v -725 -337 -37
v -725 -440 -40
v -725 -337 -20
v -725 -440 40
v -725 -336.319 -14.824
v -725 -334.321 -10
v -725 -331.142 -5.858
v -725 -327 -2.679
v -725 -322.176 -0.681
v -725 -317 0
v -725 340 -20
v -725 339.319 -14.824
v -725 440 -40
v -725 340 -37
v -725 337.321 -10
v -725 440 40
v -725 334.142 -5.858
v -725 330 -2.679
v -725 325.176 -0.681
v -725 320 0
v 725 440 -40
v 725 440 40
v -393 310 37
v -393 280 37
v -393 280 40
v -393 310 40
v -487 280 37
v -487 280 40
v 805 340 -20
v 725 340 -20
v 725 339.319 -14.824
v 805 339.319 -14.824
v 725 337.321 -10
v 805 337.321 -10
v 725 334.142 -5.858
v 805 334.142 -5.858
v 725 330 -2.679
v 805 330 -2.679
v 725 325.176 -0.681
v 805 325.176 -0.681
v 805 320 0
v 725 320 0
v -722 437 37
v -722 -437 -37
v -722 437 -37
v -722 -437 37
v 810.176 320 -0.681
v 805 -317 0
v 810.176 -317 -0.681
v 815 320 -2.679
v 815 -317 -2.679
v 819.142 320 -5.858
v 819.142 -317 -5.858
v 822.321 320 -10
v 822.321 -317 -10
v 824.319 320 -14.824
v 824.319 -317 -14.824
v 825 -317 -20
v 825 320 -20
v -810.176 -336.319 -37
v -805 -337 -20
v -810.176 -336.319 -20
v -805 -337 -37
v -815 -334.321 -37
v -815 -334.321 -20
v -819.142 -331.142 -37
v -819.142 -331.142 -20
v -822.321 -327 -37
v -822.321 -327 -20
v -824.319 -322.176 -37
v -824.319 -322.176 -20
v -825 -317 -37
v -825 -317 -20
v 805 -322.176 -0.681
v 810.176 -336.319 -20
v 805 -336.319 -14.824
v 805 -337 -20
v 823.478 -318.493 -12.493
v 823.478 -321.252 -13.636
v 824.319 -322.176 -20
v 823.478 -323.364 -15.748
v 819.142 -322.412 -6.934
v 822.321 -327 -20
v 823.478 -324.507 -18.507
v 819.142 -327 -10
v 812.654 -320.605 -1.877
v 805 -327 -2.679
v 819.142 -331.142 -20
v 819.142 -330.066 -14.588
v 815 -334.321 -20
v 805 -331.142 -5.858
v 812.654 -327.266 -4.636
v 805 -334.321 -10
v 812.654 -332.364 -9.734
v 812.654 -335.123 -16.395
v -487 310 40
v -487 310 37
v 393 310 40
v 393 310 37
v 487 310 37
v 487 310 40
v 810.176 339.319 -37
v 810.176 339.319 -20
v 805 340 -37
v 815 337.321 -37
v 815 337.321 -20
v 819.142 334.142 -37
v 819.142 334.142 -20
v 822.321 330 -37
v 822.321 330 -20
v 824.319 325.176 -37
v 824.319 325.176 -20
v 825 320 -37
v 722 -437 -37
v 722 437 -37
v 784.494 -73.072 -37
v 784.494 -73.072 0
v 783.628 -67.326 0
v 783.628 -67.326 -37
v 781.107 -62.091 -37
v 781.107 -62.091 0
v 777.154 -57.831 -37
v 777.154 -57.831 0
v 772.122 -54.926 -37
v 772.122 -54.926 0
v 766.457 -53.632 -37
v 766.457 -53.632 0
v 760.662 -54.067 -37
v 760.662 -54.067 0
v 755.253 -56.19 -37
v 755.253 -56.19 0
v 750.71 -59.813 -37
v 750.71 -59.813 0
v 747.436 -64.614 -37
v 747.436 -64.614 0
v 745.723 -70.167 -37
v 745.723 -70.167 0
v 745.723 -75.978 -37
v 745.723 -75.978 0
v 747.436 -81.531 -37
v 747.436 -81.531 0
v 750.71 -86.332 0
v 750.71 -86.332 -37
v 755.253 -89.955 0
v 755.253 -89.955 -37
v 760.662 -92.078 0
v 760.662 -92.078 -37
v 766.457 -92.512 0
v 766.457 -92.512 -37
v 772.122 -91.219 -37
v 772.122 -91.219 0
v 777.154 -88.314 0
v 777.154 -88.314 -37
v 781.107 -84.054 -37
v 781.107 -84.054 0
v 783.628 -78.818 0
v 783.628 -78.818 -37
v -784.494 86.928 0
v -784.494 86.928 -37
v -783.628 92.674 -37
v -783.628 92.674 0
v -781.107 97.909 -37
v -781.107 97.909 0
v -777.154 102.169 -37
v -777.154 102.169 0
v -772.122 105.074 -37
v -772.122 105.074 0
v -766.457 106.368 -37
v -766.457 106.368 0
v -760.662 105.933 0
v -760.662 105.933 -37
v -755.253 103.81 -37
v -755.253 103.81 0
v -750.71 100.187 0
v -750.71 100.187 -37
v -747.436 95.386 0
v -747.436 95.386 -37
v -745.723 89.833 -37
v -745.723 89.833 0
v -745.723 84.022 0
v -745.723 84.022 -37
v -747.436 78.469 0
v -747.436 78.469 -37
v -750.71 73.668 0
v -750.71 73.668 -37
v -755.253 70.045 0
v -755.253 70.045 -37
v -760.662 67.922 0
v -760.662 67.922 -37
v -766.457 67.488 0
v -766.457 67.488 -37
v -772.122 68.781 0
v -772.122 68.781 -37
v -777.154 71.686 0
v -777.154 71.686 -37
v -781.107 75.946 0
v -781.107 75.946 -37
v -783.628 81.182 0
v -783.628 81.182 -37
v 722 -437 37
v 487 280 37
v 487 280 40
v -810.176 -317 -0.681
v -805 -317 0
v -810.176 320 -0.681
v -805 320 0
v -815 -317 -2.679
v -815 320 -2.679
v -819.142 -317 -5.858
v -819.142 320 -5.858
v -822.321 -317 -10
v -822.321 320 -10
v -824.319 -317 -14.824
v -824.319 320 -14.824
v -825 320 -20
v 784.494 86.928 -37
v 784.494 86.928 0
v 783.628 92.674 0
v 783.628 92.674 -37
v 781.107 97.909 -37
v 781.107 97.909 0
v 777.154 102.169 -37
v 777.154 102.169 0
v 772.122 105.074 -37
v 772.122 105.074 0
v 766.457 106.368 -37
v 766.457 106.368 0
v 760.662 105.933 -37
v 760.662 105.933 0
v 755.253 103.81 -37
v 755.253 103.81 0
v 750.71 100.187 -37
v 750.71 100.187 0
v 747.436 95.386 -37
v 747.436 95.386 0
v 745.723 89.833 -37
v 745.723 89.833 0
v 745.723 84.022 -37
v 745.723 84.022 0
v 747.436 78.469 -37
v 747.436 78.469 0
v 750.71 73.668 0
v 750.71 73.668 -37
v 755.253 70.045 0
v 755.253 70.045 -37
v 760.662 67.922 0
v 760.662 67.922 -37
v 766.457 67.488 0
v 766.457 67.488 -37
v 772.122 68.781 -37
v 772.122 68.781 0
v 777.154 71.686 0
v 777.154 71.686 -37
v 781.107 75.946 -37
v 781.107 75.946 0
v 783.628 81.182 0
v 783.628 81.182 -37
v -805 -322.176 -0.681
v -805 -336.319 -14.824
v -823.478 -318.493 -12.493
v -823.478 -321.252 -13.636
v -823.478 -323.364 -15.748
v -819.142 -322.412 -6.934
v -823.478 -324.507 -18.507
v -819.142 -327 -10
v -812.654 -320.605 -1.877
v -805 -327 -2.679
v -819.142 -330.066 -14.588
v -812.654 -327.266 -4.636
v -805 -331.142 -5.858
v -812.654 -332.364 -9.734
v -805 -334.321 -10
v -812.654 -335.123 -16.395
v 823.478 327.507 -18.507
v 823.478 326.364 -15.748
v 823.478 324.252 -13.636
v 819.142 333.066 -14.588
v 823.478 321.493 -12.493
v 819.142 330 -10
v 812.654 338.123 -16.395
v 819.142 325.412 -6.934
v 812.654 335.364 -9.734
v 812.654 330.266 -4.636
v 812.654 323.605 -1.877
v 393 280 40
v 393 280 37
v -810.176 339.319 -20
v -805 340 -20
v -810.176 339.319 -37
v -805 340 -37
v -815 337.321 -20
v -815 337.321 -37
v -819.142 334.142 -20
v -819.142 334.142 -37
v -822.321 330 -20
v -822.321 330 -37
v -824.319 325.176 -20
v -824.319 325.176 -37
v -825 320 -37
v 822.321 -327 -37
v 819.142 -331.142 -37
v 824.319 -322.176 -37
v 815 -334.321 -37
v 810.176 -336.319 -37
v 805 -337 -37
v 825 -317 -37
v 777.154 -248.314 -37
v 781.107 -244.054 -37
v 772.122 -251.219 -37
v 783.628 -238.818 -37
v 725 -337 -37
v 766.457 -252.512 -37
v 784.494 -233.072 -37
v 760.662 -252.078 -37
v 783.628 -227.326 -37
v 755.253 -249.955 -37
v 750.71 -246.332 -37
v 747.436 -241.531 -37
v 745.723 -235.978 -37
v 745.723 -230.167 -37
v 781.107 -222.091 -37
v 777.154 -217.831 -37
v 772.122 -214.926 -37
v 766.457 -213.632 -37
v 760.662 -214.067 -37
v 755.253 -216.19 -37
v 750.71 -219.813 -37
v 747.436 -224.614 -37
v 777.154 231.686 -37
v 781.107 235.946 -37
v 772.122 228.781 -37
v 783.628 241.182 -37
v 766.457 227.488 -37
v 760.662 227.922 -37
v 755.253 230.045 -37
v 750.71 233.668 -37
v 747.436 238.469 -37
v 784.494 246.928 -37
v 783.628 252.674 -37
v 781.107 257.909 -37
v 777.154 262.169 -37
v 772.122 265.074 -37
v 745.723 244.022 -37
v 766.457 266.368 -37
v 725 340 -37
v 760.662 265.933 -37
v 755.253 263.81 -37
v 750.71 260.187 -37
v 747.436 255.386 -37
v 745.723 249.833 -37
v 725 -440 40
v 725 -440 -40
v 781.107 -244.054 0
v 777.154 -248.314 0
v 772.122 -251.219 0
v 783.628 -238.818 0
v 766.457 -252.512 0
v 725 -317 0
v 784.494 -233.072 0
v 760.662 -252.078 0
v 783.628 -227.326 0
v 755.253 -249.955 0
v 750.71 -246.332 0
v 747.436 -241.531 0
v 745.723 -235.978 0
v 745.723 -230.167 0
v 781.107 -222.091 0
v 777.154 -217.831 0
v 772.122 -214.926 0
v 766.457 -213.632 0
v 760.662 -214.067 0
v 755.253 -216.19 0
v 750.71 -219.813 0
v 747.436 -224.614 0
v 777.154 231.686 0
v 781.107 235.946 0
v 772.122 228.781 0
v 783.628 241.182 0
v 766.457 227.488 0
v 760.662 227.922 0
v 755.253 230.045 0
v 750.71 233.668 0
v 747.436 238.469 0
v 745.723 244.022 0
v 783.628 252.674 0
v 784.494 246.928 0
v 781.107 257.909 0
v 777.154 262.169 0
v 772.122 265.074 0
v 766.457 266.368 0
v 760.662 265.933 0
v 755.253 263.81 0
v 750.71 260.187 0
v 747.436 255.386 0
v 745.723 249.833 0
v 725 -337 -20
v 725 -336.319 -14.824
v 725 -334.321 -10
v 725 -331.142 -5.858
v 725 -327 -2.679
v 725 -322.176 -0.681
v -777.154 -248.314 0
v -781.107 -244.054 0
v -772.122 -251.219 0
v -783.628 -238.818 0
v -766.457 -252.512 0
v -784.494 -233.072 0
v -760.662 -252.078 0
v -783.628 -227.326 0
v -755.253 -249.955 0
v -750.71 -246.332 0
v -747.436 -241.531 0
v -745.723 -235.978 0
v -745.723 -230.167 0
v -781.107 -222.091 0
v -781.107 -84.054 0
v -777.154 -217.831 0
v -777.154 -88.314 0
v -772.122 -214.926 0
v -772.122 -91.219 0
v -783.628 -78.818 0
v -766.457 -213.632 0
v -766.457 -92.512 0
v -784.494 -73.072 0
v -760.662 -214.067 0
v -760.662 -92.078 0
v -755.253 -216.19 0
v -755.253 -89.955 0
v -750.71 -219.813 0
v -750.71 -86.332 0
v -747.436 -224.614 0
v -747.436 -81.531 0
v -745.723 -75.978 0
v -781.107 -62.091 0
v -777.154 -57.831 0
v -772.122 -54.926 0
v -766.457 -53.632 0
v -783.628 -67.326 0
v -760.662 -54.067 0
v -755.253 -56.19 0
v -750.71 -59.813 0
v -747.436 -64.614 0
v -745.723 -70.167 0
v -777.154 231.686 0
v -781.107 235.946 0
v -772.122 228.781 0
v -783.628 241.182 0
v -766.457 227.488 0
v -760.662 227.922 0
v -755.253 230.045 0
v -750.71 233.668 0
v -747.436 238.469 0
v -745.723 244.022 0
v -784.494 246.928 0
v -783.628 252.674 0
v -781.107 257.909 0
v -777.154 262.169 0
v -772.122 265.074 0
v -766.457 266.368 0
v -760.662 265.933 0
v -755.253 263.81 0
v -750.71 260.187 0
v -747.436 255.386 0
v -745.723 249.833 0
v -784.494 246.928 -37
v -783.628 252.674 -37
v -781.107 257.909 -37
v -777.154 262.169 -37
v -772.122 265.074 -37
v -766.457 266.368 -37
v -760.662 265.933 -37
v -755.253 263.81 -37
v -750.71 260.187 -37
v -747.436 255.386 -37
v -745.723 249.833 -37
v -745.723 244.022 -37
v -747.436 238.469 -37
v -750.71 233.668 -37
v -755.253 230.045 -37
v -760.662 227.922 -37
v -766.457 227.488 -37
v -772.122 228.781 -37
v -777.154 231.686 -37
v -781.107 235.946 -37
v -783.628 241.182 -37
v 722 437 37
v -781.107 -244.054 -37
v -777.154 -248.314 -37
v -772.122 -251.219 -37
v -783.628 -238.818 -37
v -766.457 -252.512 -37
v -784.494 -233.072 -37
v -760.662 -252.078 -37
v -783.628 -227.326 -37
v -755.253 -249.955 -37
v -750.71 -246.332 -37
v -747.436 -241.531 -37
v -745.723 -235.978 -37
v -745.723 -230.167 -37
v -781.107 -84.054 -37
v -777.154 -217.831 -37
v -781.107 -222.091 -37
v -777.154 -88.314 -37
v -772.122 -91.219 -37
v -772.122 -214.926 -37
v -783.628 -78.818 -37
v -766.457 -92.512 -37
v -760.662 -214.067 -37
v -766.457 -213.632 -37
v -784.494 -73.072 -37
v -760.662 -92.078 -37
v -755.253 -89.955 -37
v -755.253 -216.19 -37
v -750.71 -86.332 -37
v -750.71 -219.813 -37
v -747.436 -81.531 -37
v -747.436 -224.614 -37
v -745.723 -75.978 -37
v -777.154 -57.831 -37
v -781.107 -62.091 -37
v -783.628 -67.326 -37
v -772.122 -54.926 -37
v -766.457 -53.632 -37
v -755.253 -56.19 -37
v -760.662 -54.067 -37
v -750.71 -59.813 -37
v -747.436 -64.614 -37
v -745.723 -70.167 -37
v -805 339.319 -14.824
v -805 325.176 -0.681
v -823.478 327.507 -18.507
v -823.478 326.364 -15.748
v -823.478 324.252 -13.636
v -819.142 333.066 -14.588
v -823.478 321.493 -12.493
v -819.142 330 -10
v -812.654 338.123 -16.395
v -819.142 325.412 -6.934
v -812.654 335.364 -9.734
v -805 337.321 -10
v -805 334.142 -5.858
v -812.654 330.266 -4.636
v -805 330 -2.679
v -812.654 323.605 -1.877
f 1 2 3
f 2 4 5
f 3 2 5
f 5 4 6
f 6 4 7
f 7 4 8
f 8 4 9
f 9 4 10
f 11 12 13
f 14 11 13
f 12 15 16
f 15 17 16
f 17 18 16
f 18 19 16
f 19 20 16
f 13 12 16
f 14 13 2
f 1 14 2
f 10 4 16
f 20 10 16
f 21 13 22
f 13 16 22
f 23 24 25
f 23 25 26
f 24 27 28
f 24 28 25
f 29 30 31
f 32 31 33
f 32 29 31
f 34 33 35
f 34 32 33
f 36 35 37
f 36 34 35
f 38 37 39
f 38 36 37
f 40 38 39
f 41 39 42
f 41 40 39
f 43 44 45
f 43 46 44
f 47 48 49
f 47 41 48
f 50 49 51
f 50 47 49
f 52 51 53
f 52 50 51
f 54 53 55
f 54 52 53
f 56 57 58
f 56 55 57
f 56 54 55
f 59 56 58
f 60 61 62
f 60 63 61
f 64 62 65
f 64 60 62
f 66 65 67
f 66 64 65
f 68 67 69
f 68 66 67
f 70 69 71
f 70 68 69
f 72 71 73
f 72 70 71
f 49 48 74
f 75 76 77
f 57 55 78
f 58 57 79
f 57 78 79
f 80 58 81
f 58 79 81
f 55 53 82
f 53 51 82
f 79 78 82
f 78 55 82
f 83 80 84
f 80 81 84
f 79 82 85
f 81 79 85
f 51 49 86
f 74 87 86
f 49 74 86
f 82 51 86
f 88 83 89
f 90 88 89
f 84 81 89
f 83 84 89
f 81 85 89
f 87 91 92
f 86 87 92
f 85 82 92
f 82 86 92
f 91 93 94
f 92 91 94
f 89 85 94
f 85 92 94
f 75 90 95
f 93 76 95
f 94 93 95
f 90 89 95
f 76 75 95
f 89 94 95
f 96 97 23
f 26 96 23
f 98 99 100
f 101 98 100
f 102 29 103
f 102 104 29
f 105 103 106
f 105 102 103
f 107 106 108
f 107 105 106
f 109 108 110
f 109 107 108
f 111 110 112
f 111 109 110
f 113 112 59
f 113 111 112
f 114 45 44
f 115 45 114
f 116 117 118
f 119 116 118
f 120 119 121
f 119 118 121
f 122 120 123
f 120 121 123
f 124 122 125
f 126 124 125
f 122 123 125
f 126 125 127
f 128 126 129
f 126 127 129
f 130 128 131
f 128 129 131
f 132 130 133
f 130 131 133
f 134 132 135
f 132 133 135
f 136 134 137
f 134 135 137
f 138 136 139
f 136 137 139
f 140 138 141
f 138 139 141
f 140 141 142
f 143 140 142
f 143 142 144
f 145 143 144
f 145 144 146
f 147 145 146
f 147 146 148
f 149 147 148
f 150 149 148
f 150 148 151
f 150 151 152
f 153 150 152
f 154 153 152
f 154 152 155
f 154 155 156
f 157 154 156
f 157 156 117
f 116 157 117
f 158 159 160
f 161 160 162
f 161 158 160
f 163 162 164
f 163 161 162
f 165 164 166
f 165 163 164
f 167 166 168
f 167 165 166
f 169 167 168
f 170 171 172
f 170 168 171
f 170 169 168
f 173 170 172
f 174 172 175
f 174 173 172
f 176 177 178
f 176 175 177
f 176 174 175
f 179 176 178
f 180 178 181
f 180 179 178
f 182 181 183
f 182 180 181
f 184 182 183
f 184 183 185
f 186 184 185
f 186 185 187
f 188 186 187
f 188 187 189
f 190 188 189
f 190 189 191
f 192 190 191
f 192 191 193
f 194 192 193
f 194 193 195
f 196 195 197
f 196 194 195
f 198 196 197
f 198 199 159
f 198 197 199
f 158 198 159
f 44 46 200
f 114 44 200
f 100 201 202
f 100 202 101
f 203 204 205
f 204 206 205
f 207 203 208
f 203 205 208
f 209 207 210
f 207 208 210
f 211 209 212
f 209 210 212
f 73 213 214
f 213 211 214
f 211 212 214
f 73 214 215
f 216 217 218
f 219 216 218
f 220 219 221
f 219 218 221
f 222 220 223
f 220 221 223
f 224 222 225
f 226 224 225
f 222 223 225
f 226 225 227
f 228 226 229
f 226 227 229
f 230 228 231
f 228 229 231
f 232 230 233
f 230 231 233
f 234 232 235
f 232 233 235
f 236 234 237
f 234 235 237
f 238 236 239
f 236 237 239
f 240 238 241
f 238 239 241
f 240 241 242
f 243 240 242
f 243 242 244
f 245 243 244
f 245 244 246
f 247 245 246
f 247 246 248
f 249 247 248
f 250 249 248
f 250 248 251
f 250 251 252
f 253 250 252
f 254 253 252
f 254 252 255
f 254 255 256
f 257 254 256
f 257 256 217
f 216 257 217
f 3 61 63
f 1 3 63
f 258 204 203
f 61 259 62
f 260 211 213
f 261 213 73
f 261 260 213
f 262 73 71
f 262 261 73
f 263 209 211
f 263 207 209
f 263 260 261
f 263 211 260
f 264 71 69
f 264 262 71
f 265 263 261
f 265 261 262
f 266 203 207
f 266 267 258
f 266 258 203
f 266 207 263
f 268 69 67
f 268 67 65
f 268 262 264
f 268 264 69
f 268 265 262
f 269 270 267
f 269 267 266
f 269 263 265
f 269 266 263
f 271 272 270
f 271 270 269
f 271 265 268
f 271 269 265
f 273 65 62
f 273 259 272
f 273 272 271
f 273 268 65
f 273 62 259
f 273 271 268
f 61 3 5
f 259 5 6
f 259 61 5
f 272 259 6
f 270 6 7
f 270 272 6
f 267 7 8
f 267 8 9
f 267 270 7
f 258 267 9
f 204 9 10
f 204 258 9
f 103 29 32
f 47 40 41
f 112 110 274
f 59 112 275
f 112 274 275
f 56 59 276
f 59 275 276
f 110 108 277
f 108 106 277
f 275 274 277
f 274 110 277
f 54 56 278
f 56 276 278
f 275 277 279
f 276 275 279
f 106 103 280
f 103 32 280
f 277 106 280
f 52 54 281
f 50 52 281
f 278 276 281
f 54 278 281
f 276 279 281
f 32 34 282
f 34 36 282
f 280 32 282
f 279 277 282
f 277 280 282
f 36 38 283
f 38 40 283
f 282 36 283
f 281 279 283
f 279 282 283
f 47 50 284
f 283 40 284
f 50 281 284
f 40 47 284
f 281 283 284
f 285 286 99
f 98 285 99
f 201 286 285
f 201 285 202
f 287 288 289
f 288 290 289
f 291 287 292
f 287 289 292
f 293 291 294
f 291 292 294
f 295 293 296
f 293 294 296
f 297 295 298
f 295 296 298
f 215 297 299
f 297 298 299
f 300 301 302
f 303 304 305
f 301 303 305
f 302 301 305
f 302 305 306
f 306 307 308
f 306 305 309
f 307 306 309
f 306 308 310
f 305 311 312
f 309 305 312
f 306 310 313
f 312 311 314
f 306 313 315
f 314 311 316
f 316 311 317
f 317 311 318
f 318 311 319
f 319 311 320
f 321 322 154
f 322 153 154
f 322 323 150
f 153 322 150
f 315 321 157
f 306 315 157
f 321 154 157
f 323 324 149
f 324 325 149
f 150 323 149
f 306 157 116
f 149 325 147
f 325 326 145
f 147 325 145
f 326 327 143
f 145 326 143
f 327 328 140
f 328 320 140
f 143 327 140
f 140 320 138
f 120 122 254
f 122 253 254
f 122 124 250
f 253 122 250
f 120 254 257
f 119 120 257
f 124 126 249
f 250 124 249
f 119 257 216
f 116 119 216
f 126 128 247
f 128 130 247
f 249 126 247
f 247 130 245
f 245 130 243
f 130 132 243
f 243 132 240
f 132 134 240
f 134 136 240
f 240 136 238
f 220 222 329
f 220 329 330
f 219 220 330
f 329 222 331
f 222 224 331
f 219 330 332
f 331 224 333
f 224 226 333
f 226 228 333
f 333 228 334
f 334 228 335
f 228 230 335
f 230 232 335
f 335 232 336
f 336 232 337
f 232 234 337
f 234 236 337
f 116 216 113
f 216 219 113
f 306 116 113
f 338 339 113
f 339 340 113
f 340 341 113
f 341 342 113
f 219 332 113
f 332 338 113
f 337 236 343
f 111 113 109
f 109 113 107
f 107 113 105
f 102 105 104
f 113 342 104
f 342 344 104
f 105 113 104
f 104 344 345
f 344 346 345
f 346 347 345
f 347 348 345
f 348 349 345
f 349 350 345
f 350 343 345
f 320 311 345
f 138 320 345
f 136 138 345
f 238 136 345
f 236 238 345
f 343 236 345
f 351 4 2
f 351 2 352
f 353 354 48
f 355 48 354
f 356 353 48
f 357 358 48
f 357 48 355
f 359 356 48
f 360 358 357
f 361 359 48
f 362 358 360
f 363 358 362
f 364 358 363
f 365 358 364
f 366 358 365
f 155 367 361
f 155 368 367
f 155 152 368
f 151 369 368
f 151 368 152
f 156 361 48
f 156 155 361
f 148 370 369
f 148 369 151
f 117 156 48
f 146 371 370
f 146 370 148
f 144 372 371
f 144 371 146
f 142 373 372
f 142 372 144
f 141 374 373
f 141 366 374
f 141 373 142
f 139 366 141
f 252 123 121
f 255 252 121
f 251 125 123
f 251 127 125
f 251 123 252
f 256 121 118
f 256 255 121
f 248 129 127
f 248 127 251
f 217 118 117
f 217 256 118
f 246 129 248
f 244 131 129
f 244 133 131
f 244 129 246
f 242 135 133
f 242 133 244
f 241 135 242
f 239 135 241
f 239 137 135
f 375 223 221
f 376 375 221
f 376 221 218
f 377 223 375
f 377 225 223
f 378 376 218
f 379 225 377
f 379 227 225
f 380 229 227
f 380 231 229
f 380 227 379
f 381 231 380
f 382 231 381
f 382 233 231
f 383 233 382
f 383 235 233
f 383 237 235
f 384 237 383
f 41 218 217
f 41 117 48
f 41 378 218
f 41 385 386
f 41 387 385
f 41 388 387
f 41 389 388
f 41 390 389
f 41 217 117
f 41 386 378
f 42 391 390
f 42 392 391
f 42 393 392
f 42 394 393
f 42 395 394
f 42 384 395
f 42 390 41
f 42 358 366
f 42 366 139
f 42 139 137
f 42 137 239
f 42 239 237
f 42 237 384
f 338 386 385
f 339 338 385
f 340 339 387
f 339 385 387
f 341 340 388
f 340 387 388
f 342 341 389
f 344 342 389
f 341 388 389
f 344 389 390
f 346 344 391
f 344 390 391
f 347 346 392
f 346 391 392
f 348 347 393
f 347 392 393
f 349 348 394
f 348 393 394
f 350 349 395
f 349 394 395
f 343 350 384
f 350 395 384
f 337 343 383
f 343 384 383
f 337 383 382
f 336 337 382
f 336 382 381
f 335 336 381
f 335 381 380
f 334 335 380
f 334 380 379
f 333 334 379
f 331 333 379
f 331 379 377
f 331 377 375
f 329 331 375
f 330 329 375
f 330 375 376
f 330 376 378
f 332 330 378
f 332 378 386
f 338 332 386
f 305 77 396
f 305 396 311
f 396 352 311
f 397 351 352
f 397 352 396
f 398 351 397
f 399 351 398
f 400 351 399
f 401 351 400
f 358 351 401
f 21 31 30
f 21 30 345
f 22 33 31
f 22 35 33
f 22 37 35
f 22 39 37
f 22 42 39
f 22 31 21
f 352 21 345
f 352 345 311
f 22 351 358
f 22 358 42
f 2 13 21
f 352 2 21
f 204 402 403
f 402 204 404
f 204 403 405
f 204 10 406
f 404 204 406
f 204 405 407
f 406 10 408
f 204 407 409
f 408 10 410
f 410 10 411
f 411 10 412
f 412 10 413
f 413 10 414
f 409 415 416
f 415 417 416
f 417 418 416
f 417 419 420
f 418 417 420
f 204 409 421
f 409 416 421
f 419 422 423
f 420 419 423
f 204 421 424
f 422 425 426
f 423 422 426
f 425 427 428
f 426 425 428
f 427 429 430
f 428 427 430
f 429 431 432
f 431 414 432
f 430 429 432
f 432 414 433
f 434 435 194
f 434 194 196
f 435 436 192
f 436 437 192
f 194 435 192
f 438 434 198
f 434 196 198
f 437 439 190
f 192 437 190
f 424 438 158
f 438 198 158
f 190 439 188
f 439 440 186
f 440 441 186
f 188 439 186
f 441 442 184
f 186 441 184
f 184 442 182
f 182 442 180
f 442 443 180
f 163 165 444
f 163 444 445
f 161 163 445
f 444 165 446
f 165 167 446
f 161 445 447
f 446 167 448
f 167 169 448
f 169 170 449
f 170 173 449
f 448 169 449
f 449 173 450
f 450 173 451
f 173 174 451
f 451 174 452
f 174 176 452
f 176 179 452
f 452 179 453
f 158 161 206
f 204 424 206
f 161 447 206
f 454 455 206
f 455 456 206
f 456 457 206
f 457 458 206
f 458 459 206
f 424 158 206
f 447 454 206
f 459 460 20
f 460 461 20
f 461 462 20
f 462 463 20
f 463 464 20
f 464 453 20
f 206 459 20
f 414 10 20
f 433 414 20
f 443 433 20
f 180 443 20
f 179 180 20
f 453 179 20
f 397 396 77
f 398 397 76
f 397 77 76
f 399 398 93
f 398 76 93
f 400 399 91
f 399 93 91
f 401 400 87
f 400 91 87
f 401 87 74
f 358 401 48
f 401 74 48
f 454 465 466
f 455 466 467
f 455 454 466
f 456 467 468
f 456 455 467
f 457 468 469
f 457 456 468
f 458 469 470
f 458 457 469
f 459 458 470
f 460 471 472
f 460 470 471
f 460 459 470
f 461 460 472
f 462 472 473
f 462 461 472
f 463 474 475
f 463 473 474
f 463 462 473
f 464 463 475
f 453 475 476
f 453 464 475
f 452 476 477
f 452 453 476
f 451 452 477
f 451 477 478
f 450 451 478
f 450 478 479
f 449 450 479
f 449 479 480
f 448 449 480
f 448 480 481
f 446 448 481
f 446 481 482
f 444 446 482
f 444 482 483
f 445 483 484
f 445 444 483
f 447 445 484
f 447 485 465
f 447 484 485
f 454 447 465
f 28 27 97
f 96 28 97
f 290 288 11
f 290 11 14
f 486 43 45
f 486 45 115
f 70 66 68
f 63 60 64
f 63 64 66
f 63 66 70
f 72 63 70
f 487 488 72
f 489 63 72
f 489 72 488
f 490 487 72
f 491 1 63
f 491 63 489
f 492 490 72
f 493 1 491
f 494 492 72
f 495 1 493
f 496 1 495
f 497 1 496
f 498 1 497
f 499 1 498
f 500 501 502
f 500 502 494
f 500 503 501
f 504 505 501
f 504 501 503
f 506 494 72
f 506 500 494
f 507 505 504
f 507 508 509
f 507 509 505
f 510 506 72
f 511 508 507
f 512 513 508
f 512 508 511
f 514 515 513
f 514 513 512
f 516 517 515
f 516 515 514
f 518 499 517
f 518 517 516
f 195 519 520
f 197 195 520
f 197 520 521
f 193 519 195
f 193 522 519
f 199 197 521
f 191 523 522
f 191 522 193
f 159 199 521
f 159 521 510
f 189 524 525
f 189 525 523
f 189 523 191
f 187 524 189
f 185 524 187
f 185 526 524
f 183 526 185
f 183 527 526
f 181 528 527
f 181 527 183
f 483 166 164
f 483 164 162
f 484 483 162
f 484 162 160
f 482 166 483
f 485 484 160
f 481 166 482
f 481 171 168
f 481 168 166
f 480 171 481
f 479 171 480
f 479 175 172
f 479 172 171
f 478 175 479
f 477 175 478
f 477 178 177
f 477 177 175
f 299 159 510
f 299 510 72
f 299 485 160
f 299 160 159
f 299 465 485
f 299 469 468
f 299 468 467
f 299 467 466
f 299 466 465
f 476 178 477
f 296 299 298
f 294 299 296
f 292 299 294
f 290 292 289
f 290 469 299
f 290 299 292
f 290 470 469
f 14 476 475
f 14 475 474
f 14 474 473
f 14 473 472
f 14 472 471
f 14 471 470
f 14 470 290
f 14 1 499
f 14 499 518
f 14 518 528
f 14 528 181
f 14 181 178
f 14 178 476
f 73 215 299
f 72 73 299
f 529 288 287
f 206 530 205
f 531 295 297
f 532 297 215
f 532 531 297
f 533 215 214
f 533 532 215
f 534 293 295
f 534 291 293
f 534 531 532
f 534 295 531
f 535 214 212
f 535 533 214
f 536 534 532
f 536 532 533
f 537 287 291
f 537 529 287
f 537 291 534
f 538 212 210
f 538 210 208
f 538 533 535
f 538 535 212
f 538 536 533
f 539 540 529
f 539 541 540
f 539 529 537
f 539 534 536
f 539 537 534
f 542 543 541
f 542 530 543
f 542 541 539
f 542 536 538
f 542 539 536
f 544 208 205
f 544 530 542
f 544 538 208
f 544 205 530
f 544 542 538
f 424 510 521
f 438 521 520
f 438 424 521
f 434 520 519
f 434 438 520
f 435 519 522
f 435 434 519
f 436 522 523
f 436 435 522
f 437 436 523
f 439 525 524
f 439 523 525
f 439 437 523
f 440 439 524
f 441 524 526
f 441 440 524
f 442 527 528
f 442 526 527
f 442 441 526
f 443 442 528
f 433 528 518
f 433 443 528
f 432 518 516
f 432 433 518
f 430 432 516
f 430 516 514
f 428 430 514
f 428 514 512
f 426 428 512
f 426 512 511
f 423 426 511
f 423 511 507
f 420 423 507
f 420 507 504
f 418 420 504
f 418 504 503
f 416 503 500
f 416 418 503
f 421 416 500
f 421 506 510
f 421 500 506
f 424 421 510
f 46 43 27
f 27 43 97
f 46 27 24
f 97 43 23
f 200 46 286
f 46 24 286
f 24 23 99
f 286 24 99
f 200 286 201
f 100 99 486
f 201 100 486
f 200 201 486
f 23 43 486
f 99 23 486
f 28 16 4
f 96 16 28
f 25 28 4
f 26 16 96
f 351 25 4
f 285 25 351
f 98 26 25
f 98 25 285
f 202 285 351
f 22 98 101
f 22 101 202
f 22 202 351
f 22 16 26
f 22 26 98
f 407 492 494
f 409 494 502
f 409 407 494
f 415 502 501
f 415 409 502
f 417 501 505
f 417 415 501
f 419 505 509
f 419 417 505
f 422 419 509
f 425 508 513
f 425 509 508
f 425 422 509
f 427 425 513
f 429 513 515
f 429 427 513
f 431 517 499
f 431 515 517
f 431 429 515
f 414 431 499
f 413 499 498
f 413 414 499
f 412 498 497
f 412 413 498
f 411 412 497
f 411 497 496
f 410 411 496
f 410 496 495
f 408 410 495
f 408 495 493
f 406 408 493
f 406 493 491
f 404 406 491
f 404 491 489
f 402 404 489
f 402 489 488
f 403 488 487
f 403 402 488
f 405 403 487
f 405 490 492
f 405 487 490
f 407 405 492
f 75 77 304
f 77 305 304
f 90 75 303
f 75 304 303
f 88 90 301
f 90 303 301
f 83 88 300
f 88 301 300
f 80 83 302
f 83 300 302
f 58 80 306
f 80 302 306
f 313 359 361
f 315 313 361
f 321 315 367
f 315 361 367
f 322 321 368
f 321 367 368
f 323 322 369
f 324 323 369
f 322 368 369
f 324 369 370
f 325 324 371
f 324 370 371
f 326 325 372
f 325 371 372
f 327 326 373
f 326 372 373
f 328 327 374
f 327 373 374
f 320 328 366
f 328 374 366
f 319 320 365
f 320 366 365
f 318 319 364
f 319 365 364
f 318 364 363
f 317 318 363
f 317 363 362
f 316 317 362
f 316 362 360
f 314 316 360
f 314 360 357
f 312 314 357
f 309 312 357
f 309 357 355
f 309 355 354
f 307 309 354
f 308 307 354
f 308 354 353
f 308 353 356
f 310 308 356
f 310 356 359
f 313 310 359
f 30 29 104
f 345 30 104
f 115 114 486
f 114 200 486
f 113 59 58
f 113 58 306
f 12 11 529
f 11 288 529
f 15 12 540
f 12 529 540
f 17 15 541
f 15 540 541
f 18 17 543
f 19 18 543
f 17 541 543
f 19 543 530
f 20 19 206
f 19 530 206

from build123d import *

# Parameters (mm, degrees)
SKETCH1_W            = 1450
SKETCH1_H            = 880
BOSS_EXTRUDE1_DEPTH  = 40
SHELL1_T             = 3
SKETCH2_W            = 94
SKETCH2_H            = 30
CUT_EXTRUDE1_DEPTH   = 118
SKETCH3_W            = 37
SKETCH3_H            = 677
BOSS_EXTRUDE2_DEPTH  = 100
FILLET1_R            = 20
SKETCH4_R            = 19.494294984
CUT_EXTRUDE2_DEPTH   = 100
FILLET1_OF_MIRROR1_R = 20


with BuildPart() as part:
    # Sketch1 → Boss-Extrude1 (new, symmetric)
    with BuildSketch(Plane.XY):
        Rectangle(SKETCH1_W, SKETCH1_H)
    extrude(amount=BOSS_EXTRUDE1_DEPTH, both=True)

    # Shell1 (no face opened: a closed hollow body)
    add(offset(amount=-SHELL1_T, mode=Mode.PRIVATE), mode=Mode.SUBTRACT)

    # Sketch2 → Cut-Extrude1 (cut)
    with BuildSketch(Plane.XY):
        with Locations((-440, 295)):
            Rectangle(SKETCH2_W, SKETCH2_H)
        with Locations((440, 295)):
            Rectangle(SKETCH2_W, SKETCH2_H)
    extrude(amount=CUT_EXTRUDE1_DEPTH, mode=Mode.SUBTRACT)

    # Sketch3 → Boss-Extrude2 (add)
    with BuildSketch(Plane(origin=(725, 0, 0), x_dir=(0, 0, -1), z_dir=(1, 0, 0))):
        with Locations((18.5, 1.5)):
            Rectangle(SKETCH3_W, SKETCH3_H)
    boss_extrude2 = extrude(amount=BOSS_EXTRUDE2_DEPTH)

    # Fillet1
    fillet1_edges = [part.edges().sort_by_distance(p)[0] for p in [
        (775, 340, 0),
        (775, -337, 0),
        (825, 340, -18.5),
        (825, 1.5, 0),
        (825, -337, -18.5),
    ]]
    fillet(fillet1_edges, radius=FILLET1_R)

    # Sketch4 → Cut-Extrude2 (cut)
    with BuildSketch(Plane.XY):
        with Locations((765, 246.927736461)):
            Circle(SKETCH4_R)
        with Locations((765, 86.927736461)):
            Circle(SKETCH4_R)
        with Locations((765, -73.072263539)):
            Circle(SKETCH4_R)
        with Locations((765, -233.072263539)):
            Circle(SKETCH4_R)
    cut_extrude2 = extrude(amount=-CUT_EXTRUDE2_DEPTH, mode=Mode.SUBTRACT)

    # Mirror1: Boss-Extrude2, Cut-Extrude2 across plane
    add(boss_extrude2.mirror(Plane(origin=(0, 0, 0), x_dir=(0, 0, 1), z_dir=(1, 0, 0))))
    add(cut_extrude2.mirror(Plane(origin=(0, 0, 0), x_dir=(0, 0, 1), z_dir=(1, 0, 0))), mode=Mode.SUBTRACT)

    # Fillet1 of Mirror1
    fillet1_of_mirror1_edges = [part.edges().sort_by_distance(p)[0] for p in [
        (-775, 340, 0),
        (-775, -337, 0),
        (-825, 340, -18.5),
        (-825, 1.5, 0),
        (-825, -337, -18.5),
    ]]
    fillet(fillet1_of_mirror1_edges, radius=FILLET1_OF_MIRROR1_R)


solid = part.part
